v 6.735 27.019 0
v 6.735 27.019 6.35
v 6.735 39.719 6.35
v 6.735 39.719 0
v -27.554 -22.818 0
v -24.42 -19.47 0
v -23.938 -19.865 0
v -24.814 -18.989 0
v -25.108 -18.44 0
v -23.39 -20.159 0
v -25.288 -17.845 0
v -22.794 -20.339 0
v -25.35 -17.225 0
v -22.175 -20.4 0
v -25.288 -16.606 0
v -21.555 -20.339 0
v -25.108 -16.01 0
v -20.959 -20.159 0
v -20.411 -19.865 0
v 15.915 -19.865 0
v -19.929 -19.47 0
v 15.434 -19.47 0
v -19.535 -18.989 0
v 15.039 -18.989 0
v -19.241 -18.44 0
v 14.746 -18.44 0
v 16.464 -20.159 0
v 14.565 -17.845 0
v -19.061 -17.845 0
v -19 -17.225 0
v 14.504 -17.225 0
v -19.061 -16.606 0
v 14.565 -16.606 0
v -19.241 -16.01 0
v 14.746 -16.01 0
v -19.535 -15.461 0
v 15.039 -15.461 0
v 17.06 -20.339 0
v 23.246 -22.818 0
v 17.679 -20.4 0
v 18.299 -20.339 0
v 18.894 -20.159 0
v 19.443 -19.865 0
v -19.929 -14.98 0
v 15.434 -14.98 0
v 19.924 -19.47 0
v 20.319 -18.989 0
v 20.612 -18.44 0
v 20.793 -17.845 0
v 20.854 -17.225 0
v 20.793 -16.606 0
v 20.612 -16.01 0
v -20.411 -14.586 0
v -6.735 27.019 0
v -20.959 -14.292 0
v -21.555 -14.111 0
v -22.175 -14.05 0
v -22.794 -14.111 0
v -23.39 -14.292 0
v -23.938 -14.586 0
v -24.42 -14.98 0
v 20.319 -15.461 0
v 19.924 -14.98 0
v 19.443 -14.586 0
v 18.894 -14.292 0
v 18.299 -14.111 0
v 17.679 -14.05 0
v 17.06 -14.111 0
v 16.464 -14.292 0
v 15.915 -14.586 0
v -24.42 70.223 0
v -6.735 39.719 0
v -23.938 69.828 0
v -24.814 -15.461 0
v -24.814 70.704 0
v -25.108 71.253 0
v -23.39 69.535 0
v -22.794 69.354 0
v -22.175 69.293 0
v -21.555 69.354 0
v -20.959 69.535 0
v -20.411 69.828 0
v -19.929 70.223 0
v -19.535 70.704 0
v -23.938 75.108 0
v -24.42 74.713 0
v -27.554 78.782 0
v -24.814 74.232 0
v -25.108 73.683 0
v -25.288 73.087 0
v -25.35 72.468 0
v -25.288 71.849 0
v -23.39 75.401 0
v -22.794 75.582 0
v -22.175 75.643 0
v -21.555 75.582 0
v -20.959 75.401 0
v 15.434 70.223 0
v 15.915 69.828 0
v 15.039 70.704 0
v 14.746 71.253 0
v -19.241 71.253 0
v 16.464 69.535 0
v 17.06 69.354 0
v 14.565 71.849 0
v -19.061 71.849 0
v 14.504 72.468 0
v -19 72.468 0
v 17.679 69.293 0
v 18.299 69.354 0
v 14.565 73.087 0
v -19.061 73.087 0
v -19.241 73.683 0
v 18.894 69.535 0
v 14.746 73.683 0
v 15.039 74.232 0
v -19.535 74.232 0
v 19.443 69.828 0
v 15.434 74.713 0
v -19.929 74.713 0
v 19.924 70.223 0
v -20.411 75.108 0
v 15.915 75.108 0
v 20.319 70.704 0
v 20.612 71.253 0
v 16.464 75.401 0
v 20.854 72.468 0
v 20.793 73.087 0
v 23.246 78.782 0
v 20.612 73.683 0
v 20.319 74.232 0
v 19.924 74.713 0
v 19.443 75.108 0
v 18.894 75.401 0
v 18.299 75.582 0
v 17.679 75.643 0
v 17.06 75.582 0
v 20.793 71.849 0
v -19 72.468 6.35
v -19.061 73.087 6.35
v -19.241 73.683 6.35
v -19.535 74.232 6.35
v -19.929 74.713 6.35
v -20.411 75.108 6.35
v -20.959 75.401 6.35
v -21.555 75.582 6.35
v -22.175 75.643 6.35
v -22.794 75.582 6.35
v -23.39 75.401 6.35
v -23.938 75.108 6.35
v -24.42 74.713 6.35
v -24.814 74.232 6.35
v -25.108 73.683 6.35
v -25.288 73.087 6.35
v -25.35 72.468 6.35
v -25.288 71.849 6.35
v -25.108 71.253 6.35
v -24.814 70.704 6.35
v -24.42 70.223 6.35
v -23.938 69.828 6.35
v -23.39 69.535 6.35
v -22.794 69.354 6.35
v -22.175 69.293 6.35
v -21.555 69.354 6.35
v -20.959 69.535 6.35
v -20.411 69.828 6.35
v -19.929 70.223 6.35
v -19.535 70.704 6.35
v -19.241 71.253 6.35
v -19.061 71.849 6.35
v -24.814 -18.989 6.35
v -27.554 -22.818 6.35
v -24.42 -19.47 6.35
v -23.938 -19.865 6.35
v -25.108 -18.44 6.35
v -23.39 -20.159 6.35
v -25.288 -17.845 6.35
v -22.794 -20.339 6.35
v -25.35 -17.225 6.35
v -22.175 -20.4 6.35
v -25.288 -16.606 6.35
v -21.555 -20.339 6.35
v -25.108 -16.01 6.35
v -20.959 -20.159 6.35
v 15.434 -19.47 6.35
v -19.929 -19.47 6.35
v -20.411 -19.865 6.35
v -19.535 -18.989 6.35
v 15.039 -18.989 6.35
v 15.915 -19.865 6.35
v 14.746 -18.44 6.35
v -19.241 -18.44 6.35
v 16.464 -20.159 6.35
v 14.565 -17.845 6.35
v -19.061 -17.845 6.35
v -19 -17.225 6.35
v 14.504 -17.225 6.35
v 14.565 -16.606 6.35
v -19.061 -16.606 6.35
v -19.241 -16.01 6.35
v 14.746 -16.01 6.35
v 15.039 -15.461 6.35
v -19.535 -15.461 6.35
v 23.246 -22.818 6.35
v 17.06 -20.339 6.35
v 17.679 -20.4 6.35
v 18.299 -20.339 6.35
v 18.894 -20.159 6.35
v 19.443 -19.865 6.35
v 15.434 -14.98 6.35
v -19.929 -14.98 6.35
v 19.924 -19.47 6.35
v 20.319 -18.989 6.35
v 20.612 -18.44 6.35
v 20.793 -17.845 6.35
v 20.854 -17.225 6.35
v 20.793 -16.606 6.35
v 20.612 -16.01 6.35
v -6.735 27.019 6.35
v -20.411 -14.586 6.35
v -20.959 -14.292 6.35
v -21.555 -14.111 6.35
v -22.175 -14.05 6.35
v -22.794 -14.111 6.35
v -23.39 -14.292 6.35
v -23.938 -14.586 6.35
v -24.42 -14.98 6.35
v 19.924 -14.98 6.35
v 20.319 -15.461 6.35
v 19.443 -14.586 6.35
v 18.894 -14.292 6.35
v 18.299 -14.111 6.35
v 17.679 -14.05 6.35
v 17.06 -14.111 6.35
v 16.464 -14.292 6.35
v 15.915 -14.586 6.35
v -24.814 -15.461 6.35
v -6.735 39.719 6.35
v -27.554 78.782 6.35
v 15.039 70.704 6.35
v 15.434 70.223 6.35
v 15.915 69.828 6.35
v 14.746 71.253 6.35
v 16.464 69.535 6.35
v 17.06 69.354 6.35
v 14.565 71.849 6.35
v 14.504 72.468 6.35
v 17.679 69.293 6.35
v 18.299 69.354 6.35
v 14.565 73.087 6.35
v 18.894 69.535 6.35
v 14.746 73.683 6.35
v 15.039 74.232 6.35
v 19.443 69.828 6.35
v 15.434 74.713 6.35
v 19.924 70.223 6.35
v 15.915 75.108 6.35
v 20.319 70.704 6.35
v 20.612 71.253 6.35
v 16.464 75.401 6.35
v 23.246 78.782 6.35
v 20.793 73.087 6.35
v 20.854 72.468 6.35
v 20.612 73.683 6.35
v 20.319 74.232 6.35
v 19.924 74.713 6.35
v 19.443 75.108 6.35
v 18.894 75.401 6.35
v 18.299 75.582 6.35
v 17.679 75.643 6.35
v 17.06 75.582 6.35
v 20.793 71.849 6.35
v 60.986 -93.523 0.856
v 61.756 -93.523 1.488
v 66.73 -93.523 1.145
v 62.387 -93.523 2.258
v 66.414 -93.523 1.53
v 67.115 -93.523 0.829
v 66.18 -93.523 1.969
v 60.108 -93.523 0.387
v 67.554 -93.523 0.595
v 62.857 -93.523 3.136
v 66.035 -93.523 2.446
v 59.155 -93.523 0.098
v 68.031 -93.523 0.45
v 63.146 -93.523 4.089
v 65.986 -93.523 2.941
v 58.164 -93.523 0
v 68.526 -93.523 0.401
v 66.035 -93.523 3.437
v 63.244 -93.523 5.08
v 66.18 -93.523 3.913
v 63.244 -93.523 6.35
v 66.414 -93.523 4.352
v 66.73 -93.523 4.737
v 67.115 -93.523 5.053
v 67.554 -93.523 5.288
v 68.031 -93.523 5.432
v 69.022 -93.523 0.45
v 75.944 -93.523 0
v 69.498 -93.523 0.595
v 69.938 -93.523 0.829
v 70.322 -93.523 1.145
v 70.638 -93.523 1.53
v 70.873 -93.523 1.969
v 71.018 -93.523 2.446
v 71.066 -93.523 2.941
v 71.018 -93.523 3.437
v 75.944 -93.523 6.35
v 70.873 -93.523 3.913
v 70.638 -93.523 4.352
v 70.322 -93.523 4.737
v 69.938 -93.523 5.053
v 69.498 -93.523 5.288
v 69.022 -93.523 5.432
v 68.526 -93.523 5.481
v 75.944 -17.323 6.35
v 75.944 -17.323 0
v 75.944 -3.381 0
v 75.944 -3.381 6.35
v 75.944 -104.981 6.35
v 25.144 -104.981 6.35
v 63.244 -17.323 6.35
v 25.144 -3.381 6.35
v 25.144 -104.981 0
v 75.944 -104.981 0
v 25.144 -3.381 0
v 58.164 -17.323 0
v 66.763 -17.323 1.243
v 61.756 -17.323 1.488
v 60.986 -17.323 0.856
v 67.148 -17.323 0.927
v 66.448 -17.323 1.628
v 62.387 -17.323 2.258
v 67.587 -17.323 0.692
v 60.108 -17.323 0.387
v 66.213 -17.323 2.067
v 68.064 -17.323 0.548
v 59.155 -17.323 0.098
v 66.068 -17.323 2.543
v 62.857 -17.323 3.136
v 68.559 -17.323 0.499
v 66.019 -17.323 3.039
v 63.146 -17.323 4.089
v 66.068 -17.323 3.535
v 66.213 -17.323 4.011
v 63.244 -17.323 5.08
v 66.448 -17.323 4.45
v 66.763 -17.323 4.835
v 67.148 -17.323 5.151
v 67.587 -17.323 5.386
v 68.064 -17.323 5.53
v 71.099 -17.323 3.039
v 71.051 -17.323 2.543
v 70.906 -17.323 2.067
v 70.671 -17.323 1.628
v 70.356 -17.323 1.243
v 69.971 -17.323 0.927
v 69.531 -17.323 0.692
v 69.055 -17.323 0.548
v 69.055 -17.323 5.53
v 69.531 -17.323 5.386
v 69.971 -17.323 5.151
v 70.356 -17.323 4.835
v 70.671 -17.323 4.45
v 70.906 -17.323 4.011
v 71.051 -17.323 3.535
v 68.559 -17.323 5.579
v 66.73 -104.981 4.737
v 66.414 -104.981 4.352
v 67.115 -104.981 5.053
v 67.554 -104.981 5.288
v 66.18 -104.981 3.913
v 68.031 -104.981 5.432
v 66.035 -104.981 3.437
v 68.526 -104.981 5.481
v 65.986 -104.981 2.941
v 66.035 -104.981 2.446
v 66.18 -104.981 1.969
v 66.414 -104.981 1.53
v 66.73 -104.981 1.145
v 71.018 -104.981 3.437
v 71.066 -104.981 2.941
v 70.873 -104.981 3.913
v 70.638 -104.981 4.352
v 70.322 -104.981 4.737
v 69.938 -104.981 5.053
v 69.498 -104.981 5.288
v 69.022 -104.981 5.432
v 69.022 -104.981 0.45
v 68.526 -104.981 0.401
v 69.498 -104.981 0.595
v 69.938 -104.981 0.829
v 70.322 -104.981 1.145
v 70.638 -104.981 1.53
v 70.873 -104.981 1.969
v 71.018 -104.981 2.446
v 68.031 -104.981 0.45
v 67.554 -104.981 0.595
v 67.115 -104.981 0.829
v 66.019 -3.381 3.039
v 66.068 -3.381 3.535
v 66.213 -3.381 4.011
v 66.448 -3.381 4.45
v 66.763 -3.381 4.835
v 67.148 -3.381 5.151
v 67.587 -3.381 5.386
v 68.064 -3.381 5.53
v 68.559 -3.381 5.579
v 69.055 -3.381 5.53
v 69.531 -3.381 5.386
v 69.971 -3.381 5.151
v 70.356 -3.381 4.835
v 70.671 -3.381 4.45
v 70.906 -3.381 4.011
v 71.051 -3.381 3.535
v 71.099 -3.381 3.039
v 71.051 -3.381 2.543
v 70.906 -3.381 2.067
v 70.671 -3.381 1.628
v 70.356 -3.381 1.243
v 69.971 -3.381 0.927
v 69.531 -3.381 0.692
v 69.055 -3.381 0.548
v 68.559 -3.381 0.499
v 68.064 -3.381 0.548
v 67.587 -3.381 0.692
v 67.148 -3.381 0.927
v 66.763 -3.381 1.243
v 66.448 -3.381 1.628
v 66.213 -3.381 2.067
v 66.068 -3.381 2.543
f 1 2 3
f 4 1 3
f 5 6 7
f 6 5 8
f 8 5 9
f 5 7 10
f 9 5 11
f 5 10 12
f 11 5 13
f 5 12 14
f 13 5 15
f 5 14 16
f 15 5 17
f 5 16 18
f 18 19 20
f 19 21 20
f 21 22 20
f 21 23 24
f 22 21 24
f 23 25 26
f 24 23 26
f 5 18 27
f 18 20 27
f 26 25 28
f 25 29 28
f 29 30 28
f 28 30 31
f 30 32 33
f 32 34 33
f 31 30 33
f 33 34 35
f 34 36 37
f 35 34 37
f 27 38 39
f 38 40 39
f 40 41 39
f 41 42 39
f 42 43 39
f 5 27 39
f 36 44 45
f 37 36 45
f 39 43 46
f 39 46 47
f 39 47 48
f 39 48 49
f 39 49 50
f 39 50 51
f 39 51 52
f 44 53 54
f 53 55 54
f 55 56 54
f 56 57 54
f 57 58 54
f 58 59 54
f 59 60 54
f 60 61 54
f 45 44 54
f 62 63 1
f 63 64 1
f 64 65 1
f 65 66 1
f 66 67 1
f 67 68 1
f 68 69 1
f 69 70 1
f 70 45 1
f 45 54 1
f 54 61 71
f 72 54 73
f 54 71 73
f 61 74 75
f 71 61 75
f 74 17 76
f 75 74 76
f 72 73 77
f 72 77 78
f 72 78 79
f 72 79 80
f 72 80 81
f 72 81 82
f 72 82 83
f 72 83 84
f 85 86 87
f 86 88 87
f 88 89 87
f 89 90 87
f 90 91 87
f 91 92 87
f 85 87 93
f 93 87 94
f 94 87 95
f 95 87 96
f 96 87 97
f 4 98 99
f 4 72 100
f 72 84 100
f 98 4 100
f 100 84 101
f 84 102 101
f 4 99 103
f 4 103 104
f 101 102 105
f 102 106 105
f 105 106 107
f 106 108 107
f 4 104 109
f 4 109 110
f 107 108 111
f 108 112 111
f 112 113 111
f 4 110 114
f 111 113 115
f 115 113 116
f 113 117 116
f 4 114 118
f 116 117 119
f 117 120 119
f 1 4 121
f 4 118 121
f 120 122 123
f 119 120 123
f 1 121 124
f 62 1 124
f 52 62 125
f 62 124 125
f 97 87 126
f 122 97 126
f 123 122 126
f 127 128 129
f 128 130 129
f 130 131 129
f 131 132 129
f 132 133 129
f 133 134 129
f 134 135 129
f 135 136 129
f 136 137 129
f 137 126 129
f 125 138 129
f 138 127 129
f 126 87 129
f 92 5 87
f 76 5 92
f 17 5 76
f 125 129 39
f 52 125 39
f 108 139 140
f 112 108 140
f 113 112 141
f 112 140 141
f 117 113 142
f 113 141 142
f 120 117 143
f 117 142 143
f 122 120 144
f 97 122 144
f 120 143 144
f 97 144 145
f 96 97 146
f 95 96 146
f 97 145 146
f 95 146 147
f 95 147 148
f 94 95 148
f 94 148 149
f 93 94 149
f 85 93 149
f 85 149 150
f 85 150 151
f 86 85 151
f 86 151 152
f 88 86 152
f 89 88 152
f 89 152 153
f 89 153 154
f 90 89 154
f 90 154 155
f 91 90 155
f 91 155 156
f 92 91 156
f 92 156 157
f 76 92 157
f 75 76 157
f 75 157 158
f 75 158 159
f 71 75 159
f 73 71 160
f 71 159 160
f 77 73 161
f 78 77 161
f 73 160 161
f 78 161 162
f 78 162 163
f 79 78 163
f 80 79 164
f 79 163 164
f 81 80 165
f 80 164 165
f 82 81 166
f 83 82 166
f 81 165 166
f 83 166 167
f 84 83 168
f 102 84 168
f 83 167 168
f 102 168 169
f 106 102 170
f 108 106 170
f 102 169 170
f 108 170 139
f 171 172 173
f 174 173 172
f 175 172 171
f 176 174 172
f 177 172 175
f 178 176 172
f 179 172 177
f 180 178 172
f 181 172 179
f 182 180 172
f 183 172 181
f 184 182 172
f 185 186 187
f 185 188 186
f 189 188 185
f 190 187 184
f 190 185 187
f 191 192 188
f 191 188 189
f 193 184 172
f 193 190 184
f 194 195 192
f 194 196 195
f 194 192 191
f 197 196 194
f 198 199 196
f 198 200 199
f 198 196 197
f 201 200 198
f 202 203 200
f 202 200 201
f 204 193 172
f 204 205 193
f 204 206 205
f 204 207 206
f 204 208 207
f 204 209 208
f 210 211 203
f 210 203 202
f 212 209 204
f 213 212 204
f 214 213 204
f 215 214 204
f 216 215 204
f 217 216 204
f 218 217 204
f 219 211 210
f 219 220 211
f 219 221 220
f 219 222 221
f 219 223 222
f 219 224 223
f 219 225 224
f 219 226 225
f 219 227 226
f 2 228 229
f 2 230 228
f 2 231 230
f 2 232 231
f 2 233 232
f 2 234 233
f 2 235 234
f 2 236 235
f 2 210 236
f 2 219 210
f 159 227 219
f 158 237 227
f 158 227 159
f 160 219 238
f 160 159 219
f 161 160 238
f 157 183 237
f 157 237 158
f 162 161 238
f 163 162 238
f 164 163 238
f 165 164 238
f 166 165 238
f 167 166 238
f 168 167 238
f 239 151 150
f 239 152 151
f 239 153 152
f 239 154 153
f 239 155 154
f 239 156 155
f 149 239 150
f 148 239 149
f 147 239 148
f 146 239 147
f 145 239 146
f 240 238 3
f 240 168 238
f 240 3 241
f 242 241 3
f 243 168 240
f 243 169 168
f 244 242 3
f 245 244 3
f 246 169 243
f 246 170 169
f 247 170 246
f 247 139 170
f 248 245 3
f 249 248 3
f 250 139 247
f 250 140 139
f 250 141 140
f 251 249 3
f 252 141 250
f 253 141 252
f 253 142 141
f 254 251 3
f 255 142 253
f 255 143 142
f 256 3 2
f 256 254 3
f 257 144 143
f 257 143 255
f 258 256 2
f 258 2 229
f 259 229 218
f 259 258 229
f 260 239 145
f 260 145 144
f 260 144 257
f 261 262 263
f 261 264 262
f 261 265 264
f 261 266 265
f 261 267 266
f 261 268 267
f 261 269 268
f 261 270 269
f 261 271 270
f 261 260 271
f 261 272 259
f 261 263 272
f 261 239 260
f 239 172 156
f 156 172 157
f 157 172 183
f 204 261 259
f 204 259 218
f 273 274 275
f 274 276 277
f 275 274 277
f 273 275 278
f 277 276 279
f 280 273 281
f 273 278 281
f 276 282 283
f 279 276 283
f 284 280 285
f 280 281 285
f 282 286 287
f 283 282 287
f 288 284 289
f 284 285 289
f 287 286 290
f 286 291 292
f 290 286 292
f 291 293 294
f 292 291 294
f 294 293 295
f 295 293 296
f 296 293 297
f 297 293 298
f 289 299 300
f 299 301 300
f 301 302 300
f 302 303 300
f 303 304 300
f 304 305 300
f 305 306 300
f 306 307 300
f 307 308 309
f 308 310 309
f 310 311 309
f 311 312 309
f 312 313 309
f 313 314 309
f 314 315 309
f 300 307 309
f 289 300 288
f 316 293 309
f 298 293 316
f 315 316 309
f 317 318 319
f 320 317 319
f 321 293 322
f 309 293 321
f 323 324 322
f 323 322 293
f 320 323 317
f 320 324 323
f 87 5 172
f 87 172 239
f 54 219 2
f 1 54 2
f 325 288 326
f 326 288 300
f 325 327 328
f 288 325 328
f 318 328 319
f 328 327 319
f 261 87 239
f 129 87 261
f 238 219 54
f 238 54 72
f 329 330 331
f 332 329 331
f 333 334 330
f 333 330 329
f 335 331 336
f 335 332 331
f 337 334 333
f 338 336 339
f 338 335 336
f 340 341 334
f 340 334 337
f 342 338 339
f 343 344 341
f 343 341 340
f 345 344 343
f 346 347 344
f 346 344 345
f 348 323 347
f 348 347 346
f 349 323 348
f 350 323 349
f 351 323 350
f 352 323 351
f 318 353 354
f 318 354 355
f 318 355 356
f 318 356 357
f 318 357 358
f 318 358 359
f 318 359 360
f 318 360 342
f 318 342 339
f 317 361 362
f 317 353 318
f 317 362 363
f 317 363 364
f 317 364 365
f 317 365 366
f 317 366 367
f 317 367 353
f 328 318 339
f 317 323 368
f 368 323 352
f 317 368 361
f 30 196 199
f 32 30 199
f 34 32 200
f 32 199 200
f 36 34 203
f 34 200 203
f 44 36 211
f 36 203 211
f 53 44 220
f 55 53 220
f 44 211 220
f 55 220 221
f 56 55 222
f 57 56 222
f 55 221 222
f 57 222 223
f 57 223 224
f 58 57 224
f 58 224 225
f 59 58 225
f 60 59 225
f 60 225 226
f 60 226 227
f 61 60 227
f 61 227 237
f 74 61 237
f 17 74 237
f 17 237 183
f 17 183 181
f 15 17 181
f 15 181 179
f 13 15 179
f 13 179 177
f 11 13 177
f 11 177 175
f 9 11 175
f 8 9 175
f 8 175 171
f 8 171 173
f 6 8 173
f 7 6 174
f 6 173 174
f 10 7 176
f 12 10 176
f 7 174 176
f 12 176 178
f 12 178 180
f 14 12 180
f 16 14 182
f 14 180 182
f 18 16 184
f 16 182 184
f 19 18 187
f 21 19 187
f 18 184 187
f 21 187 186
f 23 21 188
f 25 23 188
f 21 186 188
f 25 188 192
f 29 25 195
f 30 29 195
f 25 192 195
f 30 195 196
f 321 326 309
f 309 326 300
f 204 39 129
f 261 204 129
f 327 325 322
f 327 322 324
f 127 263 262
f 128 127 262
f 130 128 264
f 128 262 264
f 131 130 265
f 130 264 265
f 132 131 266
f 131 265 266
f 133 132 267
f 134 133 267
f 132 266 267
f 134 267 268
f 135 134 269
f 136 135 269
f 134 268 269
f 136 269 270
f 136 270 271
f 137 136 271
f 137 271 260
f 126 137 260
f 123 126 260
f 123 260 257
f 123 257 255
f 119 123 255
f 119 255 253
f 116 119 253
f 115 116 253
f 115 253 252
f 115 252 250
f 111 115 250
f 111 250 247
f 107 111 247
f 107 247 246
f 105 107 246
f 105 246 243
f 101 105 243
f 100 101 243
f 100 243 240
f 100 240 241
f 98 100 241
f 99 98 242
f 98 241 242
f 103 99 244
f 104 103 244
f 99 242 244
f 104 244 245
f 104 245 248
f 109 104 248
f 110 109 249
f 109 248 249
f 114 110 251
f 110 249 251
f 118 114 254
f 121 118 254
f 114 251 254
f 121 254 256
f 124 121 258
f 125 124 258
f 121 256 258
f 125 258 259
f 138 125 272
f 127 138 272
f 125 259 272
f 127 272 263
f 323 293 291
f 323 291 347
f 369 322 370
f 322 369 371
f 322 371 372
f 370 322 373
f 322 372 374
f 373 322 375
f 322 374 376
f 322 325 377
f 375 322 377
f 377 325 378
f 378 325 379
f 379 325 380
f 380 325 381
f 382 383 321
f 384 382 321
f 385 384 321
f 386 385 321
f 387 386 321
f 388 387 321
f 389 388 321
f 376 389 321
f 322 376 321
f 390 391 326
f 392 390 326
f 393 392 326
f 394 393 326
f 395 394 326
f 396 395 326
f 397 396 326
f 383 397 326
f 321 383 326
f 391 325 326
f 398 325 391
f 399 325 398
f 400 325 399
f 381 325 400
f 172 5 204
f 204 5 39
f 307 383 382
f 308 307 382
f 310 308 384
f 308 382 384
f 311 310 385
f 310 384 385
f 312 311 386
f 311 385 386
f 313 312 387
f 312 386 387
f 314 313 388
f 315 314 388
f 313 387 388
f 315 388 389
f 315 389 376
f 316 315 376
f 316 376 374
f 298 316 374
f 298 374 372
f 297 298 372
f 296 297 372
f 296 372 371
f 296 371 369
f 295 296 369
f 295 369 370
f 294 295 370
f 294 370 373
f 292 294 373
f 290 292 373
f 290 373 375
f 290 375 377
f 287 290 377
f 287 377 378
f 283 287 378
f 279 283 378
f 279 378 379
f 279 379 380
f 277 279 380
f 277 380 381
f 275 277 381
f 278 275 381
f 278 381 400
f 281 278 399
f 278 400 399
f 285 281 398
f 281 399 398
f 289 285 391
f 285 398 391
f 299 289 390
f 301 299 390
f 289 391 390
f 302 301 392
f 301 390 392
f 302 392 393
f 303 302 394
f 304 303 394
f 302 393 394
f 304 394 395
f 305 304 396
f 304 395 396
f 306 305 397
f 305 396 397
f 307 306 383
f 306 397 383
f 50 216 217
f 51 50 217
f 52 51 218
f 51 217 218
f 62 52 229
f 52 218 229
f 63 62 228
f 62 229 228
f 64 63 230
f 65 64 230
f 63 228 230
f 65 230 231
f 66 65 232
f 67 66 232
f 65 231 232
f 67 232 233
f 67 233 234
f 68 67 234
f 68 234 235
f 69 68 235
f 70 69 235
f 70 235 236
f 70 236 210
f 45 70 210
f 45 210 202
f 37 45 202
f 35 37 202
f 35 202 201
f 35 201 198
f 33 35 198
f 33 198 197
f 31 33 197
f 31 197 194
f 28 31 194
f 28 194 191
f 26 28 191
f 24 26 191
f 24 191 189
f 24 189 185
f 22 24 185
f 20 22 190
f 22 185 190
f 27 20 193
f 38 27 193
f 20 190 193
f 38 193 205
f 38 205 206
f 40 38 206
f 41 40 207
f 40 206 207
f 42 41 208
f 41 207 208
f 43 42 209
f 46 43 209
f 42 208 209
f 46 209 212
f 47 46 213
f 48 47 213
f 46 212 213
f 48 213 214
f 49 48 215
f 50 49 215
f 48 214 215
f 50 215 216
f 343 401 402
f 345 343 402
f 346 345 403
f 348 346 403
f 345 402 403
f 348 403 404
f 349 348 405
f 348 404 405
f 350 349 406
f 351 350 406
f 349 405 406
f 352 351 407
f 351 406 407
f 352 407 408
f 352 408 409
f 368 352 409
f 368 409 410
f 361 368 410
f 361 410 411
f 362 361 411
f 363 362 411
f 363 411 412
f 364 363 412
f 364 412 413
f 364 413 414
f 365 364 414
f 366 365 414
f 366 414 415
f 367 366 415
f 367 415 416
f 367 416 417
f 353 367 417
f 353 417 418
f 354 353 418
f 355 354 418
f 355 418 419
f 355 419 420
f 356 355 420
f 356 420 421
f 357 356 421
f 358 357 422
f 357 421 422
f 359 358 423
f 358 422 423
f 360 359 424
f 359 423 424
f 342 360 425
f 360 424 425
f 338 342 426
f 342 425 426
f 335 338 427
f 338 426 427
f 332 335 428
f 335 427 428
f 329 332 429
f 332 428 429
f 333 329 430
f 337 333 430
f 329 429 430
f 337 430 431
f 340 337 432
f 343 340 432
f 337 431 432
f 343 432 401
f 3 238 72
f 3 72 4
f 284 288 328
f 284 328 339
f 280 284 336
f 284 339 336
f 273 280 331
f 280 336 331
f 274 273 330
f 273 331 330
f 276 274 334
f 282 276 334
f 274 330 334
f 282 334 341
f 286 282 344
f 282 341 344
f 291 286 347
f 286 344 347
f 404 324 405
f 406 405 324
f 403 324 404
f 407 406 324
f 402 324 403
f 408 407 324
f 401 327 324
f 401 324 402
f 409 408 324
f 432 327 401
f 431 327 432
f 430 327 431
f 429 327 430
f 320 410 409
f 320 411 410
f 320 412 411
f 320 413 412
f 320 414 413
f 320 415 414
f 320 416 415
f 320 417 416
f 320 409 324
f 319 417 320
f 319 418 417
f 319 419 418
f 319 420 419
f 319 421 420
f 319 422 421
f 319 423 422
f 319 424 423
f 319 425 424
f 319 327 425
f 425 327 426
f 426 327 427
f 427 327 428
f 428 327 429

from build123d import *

# Parameters (mm, degrees)
F0_W      = 50.8
F0_H      = 101.6
F1_DEPTH  = 6.35
F3_R      = 3.175
F4_DEPTH  = 25.4
F6_W      = 13.469696
F6_H      = 12.7
F7_DEPTH  = 25.4
F8_W      = 50.8
F8_H      = 101.6
F9_DEPTH  = 6.35
F10_W     = 12.7
F10_H     = 76.2
F11_DEPTH = 25.4
F12_R     = 2.54
F13_DEPTH = 25.4
F14_R     = 2.54
F15_DEPTH = 25.4
F16_R     = 5.08


with BuildPart() as f1:
    # F0 (on Top) → F1 (new body)
    with BuildSketch(Plane.XY):
        with Locations((-2.154493, 27.9817)):
            Rectangle(F0_W, F0_H)
    extrude(amount=F1_DEPTH)

    # F3 (on face) → F4 (cut)
    with BuildSketch(Plane.XY.offset(6.35)):
        with Locations((-22.174506, 72.468052)):
            Circle(F3_R)
        with Locations((-22.174506, -17.225419)):
            Circle(F3_R)
        with Locations((17.679164, 72.468052)):
            Circle(F3_R)
        with Locations((17.679164, -17.225419)):
            Circle(F3_R)
    extrude(amount=-F4_DEPTH, mode=Mode.SUBTRACT)

    # F6 (on face) → F7 (cut)
    with BuildSketch(Plane.XY.offset(6.35)):
        with Locations((0, 33.368628)):
            Rectangle(F6_W, F6_H)
    extrude(amount=-F7_DEPTH, mode=Mode.SUBTRACT)


with BuildPart() as f9:
    # F8 (on Top) → F9 (new body)
    with BuildSketch(Plane.XY):
        with Locations((50.543553, -54.180697)):
            Rectangle(F8_W, F8_H)
    extrude(amount=F9_DEPTH)

    # F10 (on face) → F11 (cut)
    with BuildSketch(Plane.XY.offset(6.35)):
        with Locations((69.593553, -55.422756)):
            Rectangle(F10_W, F10_H)
    extrude(amount=-F11_DEPTH, mode=Mode.SUBTRACT)

    # F12 (on face) → F13 (cut)
    with BuildSketch(Plane.XZ.offset(104.980697)):
        with Locations((68.526365, 2.941298)):
            Circle(F12_R)
    extrude(amount=-F13_DEPTH, mode=Mode.SUBTRACT)

    # F14 (on face) → F15 (cut)
    with BuildSketch(Plane(origin=(0, -3.380697, 0), x_dir=(-1, 0, 0), z_dir=(0, 1, 0))):
        with Locations((-68.559483, 3.039024)):
            Circle(F14_R)
    extrude(amount=-F15_DEPTH, mode=Mode.SUBTRACT)

    # F16
    f16_edges = [f9.edges().sort_by_distance(p)[0] for p in [
        (63.243553, -55.422756, 0),
    ]]
    fillet(f16_edges, radius=F16_R)


solid = Compound([f1.part, f9.part])
